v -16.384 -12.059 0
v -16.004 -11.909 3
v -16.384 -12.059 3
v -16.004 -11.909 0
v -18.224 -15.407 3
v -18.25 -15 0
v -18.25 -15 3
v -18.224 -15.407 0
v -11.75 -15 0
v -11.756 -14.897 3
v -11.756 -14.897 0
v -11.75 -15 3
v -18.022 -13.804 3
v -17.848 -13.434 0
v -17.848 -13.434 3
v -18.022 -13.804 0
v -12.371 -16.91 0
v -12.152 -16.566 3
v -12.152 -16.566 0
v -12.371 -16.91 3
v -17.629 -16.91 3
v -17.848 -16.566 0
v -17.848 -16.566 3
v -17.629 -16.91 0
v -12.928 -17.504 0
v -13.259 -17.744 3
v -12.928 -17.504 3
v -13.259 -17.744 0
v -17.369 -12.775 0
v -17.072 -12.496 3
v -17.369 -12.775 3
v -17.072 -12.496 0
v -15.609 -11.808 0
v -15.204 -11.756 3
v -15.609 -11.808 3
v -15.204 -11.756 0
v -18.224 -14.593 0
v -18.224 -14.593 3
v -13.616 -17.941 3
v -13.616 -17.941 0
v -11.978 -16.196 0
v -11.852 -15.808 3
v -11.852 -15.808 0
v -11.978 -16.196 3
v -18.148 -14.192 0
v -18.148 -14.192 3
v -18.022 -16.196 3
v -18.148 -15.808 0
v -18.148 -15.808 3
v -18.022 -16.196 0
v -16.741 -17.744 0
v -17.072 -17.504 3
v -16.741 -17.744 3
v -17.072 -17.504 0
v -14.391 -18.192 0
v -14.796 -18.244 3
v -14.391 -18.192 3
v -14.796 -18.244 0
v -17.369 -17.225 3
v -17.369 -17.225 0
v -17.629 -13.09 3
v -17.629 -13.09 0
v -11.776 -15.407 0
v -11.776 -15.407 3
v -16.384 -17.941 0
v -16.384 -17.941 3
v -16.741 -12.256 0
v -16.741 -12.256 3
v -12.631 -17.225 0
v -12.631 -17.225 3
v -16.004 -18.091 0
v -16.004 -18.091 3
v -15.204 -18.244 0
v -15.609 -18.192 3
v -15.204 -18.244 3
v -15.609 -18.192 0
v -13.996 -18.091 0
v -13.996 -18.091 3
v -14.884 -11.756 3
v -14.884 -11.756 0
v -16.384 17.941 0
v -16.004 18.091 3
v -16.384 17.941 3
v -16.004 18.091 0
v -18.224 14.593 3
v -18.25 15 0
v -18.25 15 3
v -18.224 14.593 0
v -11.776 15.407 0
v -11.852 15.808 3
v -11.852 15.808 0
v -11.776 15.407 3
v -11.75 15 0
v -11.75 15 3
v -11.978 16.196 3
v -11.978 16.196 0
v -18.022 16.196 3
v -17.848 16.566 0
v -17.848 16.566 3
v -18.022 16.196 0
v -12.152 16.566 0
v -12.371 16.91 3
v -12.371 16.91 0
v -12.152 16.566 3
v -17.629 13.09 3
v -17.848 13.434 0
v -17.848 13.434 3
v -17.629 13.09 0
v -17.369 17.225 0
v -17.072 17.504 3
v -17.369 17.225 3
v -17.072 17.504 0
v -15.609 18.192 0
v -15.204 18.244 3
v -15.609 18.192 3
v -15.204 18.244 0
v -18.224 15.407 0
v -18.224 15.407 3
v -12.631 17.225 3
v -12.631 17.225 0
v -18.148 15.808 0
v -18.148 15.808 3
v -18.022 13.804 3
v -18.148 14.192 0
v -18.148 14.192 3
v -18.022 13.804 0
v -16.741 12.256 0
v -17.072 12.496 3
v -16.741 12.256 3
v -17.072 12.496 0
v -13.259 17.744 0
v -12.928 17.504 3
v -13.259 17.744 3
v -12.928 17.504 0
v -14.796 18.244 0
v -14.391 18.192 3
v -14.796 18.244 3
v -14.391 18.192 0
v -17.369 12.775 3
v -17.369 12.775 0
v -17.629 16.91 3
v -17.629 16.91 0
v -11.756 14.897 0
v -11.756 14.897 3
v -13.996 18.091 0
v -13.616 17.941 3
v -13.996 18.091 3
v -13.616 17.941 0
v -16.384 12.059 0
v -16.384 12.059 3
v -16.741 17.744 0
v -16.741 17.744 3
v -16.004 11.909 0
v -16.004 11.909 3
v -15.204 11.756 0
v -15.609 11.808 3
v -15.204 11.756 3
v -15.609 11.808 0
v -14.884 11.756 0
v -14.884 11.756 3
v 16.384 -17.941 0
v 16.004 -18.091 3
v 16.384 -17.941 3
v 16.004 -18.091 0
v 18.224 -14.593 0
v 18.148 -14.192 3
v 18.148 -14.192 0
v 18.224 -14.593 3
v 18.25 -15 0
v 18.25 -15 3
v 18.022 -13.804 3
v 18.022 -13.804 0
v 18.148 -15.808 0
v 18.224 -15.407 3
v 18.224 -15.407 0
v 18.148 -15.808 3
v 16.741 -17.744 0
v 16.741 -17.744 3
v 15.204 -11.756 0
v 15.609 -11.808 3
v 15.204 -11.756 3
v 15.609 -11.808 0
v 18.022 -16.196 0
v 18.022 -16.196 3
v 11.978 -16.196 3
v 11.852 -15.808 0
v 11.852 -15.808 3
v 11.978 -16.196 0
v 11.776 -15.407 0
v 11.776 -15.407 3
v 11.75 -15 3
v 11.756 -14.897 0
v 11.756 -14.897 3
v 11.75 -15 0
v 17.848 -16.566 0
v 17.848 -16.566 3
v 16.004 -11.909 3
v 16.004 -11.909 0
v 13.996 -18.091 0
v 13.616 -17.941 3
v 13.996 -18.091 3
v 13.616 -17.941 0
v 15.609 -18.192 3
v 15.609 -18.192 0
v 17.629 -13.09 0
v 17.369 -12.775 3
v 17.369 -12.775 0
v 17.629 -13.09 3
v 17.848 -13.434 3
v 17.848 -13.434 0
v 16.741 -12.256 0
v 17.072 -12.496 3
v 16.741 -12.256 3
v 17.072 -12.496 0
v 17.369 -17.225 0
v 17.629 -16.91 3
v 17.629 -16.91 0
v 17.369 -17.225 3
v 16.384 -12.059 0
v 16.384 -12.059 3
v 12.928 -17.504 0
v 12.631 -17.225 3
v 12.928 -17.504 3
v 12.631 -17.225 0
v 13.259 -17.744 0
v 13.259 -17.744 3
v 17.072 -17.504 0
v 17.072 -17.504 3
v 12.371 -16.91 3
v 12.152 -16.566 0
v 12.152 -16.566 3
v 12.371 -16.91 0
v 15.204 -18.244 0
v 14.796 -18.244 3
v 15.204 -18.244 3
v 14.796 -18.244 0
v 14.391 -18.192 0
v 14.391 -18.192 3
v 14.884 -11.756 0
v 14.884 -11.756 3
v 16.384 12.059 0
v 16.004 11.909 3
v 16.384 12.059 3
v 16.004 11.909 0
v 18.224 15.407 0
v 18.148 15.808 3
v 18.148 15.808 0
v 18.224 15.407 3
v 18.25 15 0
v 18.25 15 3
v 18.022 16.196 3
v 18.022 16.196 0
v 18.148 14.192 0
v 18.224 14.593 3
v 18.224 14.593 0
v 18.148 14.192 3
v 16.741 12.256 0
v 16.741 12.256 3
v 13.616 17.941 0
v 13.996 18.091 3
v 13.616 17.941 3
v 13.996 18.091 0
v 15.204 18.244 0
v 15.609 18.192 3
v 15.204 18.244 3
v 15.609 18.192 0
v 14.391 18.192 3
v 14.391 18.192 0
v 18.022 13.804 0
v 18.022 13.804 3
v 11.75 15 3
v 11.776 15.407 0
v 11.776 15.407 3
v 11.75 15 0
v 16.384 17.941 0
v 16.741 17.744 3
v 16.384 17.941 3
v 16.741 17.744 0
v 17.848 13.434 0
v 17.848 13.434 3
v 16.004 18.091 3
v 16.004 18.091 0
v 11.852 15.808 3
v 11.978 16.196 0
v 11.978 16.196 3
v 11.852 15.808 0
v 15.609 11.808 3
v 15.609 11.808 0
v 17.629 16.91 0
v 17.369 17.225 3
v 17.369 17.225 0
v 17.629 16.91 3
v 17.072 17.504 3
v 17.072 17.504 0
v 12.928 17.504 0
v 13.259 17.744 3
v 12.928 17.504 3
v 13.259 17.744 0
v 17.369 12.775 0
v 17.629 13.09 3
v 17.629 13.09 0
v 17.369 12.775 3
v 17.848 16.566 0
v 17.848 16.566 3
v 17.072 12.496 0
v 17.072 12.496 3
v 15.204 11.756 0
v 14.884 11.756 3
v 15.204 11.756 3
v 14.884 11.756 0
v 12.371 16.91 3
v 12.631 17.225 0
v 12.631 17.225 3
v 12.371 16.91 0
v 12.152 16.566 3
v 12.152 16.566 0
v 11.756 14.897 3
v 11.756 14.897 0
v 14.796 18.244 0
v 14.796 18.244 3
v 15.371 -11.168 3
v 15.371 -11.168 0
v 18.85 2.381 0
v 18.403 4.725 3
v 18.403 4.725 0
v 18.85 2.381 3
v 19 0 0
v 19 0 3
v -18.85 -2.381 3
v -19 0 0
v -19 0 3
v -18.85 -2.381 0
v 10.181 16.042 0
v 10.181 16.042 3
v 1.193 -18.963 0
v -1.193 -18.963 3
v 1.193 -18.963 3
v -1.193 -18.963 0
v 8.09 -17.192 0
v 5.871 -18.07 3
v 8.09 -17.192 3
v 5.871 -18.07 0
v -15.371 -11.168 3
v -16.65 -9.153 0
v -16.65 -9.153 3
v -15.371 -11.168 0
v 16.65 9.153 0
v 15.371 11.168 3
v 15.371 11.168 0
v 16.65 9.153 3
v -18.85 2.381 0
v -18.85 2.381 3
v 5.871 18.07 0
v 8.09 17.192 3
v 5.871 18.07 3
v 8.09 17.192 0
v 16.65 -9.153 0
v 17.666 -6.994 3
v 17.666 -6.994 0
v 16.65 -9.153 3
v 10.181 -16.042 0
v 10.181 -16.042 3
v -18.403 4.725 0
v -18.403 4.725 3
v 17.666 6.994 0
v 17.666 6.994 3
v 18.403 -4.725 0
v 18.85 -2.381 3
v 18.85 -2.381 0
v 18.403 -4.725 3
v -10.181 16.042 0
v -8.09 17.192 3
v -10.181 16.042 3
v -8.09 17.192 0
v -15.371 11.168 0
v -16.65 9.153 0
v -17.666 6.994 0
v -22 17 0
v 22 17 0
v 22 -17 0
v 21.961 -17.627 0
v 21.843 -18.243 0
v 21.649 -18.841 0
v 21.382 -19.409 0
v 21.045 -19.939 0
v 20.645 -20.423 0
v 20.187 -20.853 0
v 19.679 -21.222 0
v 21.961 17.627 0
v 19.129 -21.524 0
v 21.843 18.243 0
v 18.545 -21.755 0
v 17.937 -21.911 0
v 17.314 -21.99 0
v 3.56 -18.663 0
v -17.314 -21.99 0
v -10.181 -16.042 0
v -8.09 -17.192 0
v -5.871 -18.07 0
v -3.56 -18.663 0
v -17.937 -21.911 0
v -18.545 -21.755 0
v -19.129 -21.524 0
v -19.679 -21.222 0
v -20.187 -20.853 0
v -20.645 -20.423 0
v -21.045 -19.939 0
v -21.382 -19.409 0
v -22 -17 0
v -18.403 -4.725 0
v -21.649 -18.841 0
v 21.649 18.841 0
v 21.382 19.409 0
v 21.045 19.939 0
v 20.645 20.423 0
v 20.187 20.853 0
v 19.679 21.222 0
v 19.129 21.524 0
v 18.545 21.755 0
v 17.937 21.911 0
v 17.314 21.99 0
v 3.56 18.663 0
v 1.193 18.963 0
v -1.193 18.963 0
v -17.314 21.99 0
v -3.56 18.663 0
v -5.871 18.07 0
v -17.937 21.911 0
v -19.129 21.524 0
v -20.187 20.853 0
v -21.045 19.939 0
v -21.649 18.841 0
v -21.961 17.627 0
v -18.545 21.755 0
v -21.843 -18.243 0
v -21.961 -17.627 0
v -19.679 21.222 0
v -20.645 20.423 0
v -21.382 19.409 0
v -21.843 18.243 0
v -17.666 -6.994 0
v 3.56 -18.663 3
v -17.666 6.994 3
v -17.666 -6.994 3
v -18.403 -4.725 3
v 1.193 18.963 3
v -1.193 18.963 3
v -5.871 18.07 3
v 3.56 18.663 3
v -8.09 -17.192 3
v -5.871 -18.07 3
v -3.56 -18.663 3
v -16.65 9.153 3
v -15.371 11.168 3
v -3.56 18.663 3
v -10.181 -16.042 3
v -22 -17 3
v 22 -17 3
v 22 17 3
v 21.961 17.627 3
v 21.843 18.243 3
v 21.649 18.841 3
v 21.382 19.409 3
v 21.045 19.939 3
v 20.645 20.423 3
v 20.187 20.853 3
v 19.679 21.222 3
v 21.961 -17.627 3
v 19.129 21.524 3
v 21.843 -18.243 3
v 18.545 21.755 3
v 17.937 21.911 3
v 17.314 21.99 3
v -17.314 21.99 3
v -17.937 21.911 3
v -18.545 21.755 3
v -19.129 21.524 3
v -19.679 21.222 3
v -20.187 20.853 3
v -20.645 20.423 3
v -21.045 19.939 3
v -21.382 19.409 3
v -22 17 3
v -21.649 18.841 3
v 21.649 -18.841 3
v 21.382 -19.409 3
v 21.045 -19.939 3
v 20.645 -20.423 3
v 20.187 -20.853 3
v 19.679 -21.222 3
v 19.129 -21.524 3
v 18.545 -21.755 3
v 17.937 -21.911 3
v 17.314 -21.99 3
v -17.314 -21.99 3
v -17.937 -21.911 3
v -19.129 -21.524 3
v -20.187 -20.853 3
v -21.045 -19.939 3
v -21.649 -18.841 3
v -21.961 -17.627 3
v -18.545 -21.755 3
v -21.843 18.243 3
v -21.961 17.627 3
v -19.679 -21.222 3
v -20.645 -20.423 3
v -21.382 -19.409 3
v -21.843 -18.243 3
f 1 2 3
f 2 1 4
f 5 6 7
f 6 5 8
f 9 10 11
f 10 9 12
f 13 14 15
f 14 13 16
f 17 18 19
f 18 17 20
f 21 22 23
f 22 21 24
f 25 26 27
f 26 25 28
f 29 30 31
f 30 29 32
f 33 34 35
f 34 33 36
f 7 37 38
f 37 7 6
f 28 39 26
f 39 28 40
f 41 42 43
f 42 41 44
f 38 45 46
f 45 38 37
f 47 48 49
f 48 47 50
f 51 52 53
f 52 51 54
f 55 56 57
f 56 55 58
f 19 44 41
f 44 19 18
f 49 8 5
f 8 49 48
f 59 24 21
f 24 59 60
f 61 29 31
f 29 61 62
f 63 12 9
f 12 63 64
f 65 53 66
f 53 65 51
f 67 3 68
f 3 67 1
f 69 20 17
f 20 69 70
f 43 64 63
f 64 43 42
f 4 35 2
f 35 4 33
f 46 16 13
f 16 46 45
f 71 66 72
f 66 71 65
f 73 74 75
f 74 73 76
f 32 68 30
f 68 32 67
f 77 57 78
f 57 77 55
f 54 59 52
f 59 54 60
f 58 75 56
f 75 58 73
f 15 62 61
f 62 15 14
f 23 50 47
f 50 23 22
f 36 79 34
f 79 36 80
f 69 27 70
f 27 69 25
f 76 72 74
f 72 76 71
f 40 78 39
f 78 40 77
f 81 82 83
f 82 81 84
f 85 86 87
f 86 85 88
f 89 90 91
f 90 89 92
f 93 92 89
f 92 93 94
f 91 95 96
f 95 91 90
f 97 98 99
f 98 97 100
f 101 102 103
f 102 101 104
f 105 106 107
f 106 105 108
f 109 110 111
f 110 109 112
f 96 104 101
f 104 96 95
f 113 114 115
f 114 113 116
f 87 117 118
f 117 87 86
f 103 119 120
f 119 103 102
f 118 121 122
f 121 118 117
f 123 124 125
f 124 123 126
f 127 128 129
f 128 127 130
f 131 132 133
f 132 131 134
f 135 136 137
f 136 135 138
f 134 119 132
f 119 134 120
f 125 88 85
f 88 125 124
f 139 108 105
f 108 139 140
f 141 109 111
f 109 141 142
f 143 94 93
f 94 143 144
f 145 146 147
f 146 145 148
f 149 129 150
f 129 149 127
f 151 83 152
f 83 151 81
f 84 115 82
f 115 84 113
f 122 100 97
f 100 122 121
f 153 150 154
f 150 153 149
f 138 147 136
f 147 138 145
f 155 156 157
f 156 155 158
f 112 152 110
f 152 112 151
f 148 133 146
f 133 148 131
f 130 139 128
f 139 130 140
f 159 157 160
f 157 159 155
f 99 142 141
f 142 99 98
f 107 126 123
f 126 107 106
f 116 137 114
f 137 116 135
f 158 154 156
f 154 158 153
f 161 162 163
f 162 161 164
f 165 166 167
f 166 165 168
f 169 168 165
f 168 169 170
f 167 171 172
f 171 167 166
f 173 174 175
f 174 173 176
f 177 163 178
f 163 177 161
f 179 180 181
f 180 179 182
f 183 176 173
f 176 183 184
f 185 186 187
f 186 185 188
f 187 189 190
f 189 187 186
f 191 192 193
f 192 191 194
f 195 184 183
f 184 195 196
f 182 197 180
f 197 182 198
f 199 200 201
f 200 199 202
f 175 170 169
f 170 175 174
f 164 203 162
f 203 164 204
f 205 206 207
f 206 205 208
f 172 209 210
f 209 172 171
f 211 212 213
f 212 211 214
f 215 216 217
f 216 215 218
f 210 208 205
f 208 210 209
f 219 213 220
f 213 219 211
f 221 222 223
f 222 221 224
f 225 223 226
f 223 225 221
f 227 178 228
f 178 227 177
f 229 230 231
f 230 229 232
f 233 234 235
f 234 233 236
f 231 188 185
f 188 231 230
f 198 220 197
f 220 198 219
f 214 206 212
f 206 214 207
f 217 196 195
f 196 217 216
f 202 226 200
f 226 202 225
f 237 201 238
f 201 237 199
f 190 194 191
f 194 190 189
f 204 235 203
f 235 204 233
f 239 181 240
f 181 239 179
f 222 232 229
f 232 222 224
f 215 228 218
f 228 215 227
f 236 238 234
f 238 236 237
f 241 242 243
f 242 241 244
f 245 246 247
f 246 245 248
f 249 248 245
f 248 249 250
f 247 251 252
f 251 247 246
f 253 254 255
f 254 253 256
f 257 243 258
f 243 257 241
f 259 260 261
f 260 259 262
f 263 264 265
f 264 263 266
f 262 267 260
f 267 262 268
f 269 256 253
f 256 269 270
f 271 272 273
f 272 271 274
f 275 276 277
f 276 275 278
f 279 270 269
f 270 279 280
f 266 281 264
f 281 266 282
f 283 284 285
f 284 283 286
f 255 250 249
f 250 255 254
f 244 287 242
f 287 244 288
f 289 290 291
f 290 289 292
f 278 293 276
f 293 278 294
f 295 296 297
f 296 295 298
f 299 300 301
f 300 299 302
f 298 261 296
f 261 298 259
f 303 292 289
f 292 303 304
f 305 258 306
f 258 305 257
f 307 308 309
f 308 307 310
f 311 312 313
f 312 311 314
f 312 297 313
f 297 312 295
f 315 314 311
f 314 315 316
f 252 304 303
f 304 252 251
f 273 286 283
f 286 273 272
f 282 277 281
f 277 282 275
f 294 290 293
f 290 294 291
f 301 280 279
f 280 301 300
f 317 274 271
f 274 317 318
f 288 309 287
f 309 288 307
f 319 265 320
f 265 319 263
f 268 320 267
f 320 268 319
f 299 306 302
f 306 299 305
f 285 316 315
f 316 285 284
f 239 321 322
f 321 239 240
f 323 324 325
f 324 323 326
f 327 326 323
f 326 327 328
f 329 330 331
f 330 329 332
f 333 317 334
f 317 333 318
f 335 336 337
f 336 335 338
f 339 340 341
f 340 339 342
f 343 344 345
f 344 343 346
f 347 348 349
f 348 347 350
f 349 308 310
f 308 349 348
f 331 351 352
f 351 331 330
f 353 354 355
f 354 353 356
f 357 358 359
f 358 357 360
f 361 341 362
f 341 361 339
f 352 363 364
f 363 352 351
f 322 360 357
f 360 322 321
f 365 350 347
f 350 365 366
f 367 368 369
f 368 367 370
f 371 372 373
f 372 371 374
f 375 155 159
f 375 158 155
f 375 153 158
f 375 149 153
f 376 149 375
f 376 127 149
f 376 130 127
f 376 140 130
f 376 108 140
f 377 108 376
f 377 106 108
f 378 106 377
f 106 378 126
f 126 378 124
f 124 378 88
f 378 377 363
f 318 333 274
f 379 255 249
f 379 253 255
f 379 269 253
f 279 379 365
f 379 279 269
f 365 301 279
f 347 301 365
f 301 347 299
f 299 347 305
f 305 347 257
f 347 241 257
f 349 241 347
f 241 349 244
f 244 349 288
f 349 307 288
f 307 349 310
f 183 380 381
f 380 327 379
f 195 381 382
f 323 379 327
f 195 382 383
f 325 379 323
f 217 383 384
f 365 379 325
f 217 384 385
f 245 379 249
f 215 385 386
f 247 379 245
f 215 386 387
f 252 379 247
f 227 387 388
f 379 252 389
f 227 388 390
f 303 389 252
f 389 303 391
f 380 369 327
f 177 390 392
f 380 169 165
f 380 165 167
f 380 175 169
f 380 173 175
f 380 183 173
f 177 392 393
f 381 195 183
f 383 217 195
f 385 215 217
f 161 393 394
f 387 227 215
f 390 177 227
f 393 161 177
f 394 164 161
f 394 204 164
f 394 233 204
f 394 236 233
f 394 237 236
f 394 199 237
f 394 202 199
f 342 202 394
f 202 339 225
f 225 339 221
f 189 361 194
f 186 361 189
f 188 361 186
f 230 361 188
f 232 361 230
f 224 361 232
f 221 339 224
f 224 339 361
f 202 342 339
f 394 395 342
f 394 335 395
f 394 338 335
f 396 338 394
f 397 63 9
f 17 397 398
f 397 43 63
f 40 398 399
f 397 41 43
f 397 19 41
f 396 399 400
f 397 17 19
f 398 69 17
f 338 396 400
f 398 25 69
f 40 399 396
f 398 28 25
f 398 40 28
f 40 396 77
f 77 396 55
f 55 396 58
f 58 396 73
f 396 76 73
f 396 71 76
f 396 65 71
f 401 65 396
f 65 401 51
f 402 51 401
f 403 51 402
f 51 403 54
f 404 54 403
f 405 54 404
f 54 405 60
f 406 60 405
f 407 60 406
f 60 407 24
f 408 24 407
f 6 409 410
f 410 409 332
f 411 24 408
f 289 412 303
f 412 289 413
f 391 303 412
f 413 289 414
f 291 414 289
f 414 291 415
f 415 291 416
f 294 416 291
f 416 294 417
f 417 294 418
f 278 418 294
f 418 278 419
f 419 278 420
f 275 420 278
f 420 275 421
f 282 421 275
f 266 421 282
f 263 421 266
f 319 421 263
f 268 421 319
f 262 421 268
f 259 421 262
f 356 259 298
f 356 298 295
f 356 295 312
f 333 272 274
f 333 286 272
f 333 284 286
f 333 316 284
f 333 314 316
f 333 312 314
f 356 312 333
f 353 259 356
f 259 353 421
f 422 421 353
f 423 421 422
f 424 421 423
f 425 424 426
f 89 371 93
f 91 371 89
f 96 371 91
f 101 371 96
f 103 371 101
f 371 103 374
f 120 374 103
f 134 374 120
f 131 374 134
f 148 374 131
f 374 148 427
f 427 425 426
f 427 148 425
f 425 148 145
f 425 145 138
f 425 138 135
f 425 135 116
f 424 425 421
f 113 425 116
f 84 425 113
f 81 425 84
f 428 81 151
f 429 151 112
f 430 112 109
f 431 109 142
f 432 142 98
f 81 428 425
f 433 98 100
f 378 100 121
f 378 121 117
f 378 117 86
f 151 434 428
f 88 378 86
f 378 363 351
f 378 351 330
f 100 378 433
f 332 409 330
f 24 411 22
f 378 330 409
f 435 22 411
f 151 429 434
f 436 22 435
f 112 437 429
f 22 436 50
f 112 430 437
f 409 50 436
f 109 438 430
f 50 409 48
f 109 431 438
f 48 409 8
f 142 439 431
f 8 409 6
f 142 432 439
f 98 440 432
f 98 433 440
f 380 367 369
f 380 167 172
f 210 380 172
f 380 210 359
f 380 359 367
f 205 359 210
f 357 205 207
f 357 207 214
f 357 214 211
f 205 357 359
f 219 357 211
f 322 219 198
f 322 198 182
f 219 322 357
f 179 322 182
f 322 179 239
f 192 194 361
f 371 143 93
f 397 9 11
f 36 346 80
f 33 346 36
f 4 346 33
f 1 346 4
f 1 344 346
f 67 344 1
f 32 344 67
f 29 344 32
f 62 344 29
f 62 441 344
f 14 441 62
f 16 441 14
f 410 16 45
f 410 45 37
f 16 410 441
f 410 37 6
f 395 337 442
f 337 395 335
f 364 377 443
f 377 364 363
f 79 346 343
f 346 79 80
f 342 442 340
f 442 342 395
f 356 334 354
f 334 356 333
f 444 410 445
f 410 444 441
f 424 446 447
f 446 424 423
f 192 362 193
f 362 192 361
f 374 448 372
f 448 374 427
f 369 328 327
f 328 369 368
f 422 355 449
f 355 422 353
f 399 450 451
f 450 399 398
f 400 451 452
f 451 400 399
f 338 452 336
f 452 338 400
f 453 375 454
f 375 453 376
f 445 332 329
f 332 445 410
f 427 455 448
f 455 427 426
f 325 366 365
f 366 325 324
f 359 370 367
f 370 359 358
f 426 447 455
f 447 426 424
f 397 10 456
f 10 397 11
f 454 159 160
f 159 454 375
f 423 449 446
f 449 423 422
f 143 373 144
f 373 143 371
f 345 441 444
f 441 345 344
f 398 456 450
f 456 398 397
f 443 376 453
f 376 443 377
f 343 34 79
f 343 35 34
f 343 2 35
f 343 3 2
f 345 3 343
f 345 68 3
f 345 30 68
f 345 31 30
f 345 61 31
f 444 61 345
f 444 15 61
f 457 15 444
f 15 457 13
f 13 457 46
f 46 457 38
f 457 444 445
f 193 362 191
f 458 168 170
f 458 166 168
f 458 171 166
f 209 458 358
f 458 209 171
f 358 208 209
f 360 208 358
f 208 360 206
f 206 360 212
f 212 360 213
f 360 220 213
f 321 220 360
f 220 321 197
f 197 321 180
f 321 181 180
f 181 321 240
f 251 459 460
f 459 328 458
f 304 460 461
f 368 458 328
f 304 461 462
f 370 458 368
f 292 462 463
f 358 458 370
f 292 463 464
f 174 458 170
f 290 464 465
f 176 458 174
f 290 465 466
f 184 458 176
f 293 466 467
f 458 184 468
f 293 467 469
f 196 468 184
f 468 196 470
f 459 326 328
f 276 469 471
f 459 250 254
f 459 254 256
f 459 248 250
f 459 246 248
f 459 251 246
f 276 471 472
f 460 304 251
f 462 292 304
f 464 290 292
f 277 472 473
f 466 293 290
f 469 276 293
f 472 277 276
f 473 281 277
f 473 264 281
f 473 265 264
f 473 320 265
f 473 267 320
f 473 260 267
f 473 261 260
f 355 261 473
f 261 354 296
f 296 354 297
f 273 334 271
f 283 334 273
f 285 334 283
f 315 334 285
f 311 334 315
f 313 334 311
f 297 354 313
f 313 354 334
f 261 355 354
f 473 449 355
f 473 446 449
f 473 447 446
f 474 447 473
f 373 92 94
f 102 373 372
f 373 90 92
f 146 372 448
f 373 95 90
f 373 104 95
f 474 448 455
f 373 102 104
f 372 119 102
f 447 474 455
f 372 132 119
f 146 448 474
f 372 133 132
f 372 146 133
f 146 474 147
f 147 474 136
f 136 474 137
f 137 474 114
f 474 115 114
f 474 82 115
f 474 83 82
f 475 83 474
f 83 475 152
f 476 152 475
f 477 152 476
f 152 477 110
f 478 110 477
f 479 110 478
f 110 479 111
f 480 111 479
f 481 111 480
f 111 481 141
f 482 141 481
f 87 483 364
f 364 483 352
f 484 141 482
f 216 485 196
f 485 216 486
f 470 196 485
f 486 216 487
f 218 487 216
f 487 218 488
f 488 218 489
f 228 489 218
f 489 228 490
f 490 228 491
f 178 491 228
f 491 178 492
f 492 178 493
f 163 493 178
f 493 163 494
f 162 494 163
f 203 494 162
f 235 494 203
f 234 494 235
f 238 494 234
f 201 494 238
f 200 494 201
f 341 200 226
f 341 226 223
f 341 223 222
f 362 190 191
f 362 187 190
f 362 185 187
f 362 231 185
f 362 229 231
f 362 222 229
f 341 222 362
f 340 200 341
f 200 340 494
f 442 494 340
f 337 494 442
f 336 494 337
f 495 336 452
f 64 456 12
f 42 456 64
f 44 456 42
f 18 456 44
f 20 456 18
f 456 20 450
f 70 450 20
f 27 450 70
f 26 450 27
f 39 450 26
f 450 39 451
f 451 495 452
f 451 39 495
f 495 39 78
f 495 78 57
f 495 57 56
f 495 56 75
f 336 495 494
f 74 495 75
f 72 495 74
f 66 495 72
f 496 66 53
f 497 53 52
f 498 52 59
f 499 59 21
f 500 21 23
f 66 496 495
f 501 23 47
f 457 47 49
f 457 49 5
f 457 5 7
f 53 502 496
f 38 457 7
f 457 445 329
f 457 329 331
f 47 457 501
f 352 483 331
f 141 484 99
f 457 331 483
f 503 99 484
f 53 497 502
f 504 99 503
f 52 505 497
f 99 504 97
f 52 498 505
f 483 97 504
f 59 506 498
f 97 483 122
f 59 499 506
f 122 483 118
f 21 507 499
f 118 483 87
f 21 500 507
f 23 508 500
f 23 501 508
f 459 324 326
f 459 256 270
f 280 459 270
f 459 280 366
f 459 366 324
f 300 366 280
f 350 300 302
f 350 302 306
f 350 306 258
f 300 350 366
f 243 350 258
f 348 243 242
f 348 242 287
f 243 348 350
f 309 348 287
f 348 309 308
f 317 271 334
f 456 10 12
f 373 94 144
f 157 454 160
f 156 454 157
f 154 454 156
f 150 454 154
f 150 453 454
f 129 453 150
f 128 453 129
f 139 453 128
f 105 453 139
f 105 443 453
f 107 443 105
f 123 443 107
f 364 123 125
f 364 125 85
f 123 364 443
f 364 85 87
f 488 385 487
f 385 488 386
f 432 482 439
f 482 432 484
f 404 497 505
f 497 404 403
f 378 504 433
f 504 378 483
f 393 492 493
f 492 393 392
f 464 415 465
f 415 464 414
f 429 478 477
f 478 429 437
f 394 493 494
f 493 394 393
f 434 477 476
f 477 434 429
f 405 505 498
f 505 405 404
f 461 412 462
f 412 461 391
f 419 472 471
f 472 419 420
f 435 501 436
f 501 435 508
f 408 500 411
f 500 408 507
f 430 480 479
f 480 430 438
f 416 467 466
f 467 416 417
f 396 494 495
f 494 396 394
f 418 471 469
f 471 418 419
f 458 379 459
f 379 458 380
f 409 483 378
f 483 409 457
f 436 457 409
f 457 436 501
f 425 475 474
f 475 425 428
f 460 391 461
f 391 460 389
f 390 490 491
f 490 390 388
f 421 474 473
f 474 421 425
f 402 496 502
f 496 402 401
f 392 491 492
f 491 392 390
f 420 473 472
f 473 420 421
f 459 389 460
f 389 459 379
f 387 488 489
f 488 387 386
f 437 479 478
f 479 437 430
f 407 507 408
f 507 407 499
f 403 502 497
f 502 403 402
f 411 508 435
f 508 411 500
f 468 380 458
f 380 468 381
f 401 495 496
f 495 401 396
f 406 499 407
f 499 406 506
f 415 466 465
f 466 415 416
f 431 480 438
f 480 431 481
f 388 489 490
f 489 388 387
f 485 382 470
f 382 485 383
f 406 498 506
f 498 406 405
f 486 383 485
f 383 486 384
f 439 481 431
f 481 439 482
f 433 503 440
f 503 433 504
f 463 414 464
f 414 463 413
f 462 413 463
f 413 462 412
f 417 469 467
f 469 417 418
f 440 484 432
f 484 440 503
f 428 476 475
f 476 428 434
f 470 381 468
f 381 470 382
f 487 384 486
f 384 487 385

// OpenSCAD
$fn = 50;

difference() {
	union() {
		hull() {
			translate(v = [-17.0, 17.0, 0]) {
				cylinder(h = 3, r = 5);
			}
			translate(v = [17.0, 17.0, 0]) {
				cylinder(h = 3, r = 5);
			}
			translate(v = [-17.0, -17.0, 0]) {
				cylinder(h = 3, r = 5);
			}
			translate(v = [17.0, -17.0, 0]) {
				cylinder(h = 3, r = 5);
			}
		}
	}
	union() {
		translate(v = [-15.0, -15.0, -100.0]) {
			cylinder(h = 200, r = 3.25);
		}
		translate(v = [-15.0, 15.0, -100.0]) {
			cylinder(h = 200, r = 3.25);
		}
		translate(v = [15.0, -15.0, -100.0]) {
			cylinder(h = 200, r = 3.25);
		}
		translate(v = [15.0, 15.0, -100.0]) {
			cylinder(h = 200, r = 3.25);
		}
		translate(v = [-15.0, -15.0, -100.0]) {
			cylinder(h = 200, r = 1.8);
		}
		translate(v = [-15.0, 15.0, -100.0]) {
			cylinder(h = 200, r = 1.8);
		}
		translate(v = [15.0, -15.0, -100.0]) {
			cylinder(h = 200, r = 1.8);
		}
		translate(v = [15.0, 15.0, -100.0]) {
			cylinder(h = 200, r = 1.8);
		}
		cylinder(h = 3, r = 19.0);
	}
}
